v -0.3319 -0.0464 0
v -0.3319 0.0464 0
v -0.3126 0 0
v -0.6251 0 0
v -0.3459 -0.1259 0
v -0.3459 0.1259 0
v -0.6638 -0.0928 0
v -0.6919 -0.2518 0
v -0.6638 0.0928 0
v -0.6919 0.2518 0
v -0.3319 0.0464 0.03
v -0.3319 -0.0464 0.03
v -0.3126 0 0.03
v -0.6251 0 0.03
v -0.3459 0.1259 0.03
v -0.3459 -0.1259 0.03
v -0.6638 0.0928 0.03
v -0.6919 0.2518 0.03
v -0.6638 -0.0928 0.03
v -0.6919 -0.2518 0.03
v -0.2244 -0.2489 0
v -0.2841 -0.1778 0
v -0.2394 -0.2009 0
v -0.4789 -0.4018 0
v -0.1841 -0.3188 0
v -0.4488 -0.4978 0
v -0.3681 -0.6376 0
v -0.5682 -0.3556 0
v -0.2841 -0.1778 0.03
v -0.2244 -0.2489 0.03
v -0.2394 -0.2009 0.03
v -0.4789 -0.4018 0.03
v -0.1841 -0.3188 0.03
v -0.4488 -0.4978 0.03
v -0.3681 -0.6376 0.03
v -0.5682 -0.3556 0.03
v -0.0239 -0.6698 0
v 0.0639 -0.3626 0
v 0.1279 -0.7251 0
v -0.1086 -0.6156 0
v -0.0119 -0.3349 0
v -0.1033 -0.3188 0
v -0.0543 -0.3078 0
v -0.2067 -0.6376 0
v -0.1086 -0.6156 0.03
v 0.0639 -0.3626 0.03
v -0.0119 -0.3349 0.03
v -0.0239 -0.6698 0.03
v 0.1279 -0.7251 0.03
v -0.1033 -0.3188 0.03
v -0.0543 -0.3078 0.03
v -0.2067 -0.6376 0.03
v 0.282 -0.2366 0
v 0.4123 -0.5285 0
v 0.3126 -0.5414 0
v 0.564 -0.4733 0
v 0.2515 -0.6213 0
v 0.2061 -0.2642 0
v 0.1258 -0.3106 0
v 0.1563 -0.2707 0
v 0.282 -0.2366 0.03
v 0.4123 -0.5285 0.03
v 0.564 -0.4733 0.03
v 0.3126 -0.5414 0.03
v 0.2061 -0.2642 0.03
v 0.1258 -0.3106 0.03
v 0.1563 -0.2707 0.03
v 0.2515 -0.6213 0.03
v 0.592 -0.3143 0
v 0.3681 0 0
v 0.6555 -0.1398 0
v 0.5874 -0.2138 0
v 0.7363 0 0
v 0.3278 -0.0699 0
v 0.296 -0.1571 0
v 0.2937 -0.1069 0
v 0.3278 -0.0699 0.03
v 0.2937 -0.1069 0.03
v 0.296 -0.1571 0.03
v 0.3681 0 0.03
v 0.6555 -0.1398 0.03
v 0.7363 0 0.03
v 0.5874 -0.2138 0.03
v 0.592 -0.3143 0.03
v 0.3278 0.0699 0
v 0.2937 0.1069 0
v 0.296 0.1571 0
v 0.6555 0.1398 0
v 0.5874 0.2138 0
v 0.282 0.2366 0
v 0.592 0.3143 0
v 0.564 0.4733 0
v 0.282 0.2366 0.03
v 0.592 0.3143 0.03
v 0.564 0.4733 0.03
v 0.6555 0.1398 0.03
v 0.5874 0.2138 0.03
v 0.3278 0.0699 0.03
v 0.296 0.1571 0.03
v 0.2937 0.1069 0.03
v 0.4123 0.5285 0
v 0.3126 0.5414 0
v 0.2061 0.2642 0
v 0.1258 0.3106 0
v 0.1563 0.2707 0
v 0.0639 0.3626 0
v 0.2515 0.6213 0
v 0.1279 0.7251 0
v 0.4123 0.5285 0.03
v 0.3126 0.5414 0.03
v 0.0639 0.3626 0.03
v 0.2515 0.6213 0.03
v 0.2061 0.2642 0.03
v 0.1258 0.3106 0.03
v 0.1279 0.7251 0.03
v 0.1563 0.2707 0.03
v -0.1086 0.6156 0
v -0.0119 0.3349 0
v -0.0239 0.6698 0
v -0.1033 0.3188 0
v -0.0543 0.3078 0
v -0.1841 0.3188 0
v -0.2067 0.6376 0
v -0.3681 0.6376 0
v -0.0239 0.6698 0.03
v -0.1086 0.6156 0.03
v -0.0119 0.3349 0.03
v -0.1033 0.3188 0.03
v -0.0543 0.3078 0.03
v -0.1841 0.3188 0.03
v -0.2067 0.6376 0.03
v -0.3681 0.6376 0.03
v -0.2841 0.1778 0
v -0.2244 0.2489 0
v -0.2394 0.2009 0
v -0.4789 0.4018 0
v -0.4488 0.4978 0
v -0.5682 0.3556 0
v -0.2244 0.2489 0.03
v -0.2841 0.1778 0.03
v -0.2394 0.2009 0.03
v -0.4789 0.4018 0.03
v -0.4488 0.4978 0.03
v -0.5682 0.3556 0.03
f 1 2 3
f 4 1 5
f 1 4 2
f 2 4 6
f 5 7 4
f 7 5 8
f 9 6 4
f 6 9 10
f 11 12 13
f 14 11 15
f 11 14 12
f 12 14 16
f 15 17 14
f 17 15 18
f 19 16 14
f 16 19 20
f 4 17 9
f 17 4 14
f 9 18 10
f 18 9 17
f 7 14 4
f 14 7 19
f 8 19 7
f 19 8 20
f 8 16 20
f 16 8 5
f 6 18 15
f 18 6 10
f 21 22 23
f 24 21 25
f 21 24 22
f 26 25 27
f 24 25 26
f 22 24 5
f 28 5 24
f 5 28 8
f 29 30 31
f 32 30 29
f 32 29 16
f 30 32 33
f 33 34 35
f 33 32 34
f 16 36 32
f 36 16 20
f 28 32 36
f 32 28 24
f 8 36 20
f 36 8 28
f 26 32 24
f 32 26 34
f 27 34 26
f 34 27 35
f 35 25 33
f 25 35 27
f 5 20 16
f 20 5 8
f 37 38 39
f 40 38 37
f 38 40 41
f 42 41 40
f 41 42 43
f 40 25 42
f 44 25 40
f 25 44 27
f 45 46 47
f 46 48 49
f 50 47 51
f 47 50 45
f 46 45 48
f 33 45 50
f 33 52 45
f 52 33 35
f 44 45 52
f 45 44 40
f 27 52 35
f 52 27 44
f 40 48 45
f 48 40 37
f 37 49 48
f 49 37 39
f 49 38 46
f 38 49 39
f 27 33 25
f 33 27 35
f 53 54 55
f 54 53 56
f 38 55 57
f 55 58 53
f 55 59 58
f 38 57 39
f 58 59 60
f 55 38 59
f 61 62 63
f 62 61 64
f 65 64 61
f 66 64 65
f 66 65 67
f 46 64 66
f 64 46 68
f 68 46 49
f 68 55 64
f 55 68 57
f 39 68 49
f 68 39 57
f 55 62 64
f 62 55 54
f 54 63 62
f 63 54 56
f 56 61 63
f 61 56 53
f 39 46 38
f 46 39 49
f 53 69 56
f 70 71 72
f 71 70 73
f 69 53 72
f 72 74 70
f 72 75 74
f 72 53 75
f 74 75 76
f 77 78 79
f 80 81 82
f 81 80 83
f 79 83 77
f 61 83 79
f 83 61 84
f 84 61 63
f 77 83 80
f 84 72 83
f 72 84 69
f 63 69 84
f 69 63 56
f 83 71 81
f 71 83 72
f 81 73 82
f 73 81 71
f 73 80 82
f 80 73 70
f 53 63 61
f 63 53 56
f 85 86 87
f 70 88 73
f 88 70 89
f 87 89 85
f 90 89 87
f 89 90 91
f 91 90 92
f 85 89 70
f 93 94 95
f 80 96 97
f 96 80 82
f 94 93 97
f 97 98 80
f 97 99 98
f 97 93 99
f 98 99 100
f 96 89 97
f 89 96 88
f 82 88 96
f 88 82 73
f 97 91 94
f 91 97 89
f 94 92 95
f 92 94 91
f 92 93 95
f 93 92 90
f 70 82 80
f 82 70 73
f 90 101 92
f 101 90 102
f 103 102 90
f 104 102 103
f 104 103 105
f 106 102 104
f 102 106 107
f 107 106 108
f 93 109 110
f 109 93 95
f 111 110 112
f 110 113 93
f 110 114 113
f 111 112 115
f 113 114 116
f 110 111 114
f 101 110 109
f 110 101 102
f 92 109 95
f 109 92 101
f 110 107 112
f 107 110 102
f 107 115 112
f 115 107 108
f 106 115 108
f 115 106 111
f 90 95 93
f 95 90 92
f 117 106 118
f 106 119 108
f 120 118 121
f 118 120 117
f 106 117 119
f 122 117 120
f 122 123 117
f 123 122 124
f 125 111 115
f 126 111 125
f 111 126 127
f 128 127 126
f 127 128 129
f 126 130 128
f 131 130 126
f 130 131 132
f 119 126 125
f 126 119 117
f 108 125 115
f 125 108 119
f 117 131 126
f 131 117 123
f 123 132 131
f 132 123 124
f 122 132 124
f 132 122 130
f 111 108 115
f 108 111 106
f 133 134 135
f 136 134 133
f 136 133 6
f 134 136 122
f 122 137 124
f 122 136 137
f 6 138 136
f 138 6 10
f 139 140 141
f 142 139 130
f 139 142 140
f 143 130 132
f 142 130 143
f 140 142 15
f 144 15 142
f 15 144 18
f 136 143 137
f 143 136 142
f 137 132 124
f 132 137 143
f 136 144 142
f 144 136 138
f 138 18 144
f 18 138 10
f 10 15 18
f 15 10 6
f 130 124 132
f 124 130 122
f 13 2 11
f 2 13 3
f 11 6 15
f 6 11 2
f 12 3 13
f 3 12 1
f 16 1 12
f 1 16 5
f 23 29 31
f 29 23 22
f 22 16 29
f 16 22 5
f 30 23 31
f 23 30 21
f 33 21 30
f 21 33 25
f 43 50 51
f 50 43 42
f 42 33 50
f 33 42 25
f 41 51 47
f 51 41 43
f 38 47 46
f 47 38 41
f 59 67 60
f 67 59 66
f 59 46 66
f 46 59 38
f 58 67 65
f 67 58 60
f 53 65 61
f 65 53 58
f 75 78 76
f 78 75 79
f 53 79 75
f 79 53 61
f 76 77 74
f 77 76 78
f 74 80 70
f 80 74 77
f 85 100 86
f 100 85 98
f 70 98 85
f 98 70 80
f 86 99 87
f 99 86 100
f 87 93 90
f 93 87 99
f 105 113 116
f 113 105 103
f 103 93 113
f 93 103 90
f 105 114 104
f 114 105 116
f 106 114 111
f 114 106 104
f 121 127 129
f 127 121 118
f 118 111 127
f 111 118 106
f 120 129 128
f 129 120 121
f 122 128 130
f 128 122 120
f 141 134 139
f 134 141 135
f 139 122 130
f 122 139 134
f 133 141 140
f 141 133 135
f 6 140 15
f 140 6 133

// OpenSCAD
step=15;
baser=rnd(1.4,2);
phase=rnd(360);

mag1=rnd(6)*baser;
rep1=round(rnd(0,8));
ophase1=rnd(360);

mag2=rnd(6)*baser;
rep2=round(rnd(3,10));
ophase2=rnd(360);

phase0=rnd(360);
r0=rnd(0,1);
phase1=rnd(360);
r1=rnd(0,1)/2;
phase2=rnd(360);
r2=rnd(0,1)/3;
phase3=rnd(360);
r3=rnd(0,1)/4;
phase8=rnd(360);
r8=rnd(0,1)/8;
rsym=round(rnd(0,rnd(16)));
msym=round(rnd(0,rsym));
rsum=baser+r0+r1+r2+r3+r8;
difference(){
symmetries();
scale([0.5,0.5,1.1])symmetries();}


module symmetries(){
for(j=[0:360/rsym:360])rotate([0,0,j]){
intersection(){
if(msym==0)it();else union(){
    intersection(){
    it ();
    translate([-1,0,-0.05])scale([2,1,0.2])cube(1);
    }
    mirror([0,1,0]) intersection(){
    it ();
    translate([-1,0,-0.05])scale([2,1,0.2])cube(1);
    }}

if(rsym>1){intersection(){
rotate ([0,0,(360/rsym)*0.5])translate([-1,0,-0.05])scale([2,1,0.2])cube(1);
mirror([0,1,0])rotate ([0,0,(360/rsym)*0.5])translate([-1,0,-0.05])scale([2,1,0.2])cube(1);
}}else {scale([1,1,0.2])cube(2,center=true);
}
}}}

module it(){
for(i=[0:step:360]){hull(){
theta = i+ sin((i+ophase1)*rep1)*mag1+ sin((i+ophase2)*rep2)*mag2;
translate([
sin(theta+phase)*(baser+sin((i+phase0))*r0 +sin((i+phase1)*2)*r1+sin((i+phase2)*3)*r2+sin((i+phase3)*4)*r3+sin((i+phase8)*8)*r8)/rsum
,
cos(theta+phase)*(baser+sin((i+phase0))*r0+sin((i+phase1)*2)*r1+sin((i+phase2)*3)*r2+sin((i+phase3)*4)*r3+sin((i+phase8)*8)*r8)/rsum
,0

])cube(0.03,$fn=10);
ii=(i+step)%360;
theta2 = ii+ sin((ii+ophase1)*rep1)*mag1+ sin((ii+ophase2)*rep2)*mag2;
translate([
sin(theta2+phase)*(baser+sin((ii+phase0))*r0 +sin((ii+phase1)*2)*r1+sin((ii+phase2)*3)*r2+sin((ii+phase3)*4)*r3+sin((ii+phase8)*8)*r8)/rsum
,
cos(theta2+phase)*(baser+sin((ii+phase0))*r0+sin((ii+phase1)*2)*r1+sin((ii+phase2)*3)*r2+sin((ii+phase3)*4)*r3+sin((ii+phase8)*8)*r8)/rsum
,0

])cube(0.03,$fn=10);
cube(0.03,$fn=10);}}}



function un(v)=v/max(len3(v),0.000001)*1;
function p2n(pa,pb,pc)=
let(u=pa-pb,v=pa-pc)un([u[1]*v[2]-u[2]*v[1],u[2]*v[0]-u[0]*v[2],u[0]*v[1]-u[1]*v[0]]);
function avrg(v)=sumv(v,max(0,len(v)-1))/len(v);
function lerp(start,end,bias)=(end*bias+start*(1-bias));
function len3(v)=len(v)==2?sqrt(pow(v[0],2)+pow(v[1],2)):sqrt(pow(v[0],2)+pow(v[1],2)+pow(v[2],2));
function sumv(v,i,s=0)=(i==s?v[i]:v[i]+sumv(v,i-1,s));
function rnd(a=0,b=1)=(rands(min(a,b),max(a,b),1)[0]);
function rndc()=[rands(0,1,1)[0],rands(0,1,1)[0],rands(0,1,1)[0]];
